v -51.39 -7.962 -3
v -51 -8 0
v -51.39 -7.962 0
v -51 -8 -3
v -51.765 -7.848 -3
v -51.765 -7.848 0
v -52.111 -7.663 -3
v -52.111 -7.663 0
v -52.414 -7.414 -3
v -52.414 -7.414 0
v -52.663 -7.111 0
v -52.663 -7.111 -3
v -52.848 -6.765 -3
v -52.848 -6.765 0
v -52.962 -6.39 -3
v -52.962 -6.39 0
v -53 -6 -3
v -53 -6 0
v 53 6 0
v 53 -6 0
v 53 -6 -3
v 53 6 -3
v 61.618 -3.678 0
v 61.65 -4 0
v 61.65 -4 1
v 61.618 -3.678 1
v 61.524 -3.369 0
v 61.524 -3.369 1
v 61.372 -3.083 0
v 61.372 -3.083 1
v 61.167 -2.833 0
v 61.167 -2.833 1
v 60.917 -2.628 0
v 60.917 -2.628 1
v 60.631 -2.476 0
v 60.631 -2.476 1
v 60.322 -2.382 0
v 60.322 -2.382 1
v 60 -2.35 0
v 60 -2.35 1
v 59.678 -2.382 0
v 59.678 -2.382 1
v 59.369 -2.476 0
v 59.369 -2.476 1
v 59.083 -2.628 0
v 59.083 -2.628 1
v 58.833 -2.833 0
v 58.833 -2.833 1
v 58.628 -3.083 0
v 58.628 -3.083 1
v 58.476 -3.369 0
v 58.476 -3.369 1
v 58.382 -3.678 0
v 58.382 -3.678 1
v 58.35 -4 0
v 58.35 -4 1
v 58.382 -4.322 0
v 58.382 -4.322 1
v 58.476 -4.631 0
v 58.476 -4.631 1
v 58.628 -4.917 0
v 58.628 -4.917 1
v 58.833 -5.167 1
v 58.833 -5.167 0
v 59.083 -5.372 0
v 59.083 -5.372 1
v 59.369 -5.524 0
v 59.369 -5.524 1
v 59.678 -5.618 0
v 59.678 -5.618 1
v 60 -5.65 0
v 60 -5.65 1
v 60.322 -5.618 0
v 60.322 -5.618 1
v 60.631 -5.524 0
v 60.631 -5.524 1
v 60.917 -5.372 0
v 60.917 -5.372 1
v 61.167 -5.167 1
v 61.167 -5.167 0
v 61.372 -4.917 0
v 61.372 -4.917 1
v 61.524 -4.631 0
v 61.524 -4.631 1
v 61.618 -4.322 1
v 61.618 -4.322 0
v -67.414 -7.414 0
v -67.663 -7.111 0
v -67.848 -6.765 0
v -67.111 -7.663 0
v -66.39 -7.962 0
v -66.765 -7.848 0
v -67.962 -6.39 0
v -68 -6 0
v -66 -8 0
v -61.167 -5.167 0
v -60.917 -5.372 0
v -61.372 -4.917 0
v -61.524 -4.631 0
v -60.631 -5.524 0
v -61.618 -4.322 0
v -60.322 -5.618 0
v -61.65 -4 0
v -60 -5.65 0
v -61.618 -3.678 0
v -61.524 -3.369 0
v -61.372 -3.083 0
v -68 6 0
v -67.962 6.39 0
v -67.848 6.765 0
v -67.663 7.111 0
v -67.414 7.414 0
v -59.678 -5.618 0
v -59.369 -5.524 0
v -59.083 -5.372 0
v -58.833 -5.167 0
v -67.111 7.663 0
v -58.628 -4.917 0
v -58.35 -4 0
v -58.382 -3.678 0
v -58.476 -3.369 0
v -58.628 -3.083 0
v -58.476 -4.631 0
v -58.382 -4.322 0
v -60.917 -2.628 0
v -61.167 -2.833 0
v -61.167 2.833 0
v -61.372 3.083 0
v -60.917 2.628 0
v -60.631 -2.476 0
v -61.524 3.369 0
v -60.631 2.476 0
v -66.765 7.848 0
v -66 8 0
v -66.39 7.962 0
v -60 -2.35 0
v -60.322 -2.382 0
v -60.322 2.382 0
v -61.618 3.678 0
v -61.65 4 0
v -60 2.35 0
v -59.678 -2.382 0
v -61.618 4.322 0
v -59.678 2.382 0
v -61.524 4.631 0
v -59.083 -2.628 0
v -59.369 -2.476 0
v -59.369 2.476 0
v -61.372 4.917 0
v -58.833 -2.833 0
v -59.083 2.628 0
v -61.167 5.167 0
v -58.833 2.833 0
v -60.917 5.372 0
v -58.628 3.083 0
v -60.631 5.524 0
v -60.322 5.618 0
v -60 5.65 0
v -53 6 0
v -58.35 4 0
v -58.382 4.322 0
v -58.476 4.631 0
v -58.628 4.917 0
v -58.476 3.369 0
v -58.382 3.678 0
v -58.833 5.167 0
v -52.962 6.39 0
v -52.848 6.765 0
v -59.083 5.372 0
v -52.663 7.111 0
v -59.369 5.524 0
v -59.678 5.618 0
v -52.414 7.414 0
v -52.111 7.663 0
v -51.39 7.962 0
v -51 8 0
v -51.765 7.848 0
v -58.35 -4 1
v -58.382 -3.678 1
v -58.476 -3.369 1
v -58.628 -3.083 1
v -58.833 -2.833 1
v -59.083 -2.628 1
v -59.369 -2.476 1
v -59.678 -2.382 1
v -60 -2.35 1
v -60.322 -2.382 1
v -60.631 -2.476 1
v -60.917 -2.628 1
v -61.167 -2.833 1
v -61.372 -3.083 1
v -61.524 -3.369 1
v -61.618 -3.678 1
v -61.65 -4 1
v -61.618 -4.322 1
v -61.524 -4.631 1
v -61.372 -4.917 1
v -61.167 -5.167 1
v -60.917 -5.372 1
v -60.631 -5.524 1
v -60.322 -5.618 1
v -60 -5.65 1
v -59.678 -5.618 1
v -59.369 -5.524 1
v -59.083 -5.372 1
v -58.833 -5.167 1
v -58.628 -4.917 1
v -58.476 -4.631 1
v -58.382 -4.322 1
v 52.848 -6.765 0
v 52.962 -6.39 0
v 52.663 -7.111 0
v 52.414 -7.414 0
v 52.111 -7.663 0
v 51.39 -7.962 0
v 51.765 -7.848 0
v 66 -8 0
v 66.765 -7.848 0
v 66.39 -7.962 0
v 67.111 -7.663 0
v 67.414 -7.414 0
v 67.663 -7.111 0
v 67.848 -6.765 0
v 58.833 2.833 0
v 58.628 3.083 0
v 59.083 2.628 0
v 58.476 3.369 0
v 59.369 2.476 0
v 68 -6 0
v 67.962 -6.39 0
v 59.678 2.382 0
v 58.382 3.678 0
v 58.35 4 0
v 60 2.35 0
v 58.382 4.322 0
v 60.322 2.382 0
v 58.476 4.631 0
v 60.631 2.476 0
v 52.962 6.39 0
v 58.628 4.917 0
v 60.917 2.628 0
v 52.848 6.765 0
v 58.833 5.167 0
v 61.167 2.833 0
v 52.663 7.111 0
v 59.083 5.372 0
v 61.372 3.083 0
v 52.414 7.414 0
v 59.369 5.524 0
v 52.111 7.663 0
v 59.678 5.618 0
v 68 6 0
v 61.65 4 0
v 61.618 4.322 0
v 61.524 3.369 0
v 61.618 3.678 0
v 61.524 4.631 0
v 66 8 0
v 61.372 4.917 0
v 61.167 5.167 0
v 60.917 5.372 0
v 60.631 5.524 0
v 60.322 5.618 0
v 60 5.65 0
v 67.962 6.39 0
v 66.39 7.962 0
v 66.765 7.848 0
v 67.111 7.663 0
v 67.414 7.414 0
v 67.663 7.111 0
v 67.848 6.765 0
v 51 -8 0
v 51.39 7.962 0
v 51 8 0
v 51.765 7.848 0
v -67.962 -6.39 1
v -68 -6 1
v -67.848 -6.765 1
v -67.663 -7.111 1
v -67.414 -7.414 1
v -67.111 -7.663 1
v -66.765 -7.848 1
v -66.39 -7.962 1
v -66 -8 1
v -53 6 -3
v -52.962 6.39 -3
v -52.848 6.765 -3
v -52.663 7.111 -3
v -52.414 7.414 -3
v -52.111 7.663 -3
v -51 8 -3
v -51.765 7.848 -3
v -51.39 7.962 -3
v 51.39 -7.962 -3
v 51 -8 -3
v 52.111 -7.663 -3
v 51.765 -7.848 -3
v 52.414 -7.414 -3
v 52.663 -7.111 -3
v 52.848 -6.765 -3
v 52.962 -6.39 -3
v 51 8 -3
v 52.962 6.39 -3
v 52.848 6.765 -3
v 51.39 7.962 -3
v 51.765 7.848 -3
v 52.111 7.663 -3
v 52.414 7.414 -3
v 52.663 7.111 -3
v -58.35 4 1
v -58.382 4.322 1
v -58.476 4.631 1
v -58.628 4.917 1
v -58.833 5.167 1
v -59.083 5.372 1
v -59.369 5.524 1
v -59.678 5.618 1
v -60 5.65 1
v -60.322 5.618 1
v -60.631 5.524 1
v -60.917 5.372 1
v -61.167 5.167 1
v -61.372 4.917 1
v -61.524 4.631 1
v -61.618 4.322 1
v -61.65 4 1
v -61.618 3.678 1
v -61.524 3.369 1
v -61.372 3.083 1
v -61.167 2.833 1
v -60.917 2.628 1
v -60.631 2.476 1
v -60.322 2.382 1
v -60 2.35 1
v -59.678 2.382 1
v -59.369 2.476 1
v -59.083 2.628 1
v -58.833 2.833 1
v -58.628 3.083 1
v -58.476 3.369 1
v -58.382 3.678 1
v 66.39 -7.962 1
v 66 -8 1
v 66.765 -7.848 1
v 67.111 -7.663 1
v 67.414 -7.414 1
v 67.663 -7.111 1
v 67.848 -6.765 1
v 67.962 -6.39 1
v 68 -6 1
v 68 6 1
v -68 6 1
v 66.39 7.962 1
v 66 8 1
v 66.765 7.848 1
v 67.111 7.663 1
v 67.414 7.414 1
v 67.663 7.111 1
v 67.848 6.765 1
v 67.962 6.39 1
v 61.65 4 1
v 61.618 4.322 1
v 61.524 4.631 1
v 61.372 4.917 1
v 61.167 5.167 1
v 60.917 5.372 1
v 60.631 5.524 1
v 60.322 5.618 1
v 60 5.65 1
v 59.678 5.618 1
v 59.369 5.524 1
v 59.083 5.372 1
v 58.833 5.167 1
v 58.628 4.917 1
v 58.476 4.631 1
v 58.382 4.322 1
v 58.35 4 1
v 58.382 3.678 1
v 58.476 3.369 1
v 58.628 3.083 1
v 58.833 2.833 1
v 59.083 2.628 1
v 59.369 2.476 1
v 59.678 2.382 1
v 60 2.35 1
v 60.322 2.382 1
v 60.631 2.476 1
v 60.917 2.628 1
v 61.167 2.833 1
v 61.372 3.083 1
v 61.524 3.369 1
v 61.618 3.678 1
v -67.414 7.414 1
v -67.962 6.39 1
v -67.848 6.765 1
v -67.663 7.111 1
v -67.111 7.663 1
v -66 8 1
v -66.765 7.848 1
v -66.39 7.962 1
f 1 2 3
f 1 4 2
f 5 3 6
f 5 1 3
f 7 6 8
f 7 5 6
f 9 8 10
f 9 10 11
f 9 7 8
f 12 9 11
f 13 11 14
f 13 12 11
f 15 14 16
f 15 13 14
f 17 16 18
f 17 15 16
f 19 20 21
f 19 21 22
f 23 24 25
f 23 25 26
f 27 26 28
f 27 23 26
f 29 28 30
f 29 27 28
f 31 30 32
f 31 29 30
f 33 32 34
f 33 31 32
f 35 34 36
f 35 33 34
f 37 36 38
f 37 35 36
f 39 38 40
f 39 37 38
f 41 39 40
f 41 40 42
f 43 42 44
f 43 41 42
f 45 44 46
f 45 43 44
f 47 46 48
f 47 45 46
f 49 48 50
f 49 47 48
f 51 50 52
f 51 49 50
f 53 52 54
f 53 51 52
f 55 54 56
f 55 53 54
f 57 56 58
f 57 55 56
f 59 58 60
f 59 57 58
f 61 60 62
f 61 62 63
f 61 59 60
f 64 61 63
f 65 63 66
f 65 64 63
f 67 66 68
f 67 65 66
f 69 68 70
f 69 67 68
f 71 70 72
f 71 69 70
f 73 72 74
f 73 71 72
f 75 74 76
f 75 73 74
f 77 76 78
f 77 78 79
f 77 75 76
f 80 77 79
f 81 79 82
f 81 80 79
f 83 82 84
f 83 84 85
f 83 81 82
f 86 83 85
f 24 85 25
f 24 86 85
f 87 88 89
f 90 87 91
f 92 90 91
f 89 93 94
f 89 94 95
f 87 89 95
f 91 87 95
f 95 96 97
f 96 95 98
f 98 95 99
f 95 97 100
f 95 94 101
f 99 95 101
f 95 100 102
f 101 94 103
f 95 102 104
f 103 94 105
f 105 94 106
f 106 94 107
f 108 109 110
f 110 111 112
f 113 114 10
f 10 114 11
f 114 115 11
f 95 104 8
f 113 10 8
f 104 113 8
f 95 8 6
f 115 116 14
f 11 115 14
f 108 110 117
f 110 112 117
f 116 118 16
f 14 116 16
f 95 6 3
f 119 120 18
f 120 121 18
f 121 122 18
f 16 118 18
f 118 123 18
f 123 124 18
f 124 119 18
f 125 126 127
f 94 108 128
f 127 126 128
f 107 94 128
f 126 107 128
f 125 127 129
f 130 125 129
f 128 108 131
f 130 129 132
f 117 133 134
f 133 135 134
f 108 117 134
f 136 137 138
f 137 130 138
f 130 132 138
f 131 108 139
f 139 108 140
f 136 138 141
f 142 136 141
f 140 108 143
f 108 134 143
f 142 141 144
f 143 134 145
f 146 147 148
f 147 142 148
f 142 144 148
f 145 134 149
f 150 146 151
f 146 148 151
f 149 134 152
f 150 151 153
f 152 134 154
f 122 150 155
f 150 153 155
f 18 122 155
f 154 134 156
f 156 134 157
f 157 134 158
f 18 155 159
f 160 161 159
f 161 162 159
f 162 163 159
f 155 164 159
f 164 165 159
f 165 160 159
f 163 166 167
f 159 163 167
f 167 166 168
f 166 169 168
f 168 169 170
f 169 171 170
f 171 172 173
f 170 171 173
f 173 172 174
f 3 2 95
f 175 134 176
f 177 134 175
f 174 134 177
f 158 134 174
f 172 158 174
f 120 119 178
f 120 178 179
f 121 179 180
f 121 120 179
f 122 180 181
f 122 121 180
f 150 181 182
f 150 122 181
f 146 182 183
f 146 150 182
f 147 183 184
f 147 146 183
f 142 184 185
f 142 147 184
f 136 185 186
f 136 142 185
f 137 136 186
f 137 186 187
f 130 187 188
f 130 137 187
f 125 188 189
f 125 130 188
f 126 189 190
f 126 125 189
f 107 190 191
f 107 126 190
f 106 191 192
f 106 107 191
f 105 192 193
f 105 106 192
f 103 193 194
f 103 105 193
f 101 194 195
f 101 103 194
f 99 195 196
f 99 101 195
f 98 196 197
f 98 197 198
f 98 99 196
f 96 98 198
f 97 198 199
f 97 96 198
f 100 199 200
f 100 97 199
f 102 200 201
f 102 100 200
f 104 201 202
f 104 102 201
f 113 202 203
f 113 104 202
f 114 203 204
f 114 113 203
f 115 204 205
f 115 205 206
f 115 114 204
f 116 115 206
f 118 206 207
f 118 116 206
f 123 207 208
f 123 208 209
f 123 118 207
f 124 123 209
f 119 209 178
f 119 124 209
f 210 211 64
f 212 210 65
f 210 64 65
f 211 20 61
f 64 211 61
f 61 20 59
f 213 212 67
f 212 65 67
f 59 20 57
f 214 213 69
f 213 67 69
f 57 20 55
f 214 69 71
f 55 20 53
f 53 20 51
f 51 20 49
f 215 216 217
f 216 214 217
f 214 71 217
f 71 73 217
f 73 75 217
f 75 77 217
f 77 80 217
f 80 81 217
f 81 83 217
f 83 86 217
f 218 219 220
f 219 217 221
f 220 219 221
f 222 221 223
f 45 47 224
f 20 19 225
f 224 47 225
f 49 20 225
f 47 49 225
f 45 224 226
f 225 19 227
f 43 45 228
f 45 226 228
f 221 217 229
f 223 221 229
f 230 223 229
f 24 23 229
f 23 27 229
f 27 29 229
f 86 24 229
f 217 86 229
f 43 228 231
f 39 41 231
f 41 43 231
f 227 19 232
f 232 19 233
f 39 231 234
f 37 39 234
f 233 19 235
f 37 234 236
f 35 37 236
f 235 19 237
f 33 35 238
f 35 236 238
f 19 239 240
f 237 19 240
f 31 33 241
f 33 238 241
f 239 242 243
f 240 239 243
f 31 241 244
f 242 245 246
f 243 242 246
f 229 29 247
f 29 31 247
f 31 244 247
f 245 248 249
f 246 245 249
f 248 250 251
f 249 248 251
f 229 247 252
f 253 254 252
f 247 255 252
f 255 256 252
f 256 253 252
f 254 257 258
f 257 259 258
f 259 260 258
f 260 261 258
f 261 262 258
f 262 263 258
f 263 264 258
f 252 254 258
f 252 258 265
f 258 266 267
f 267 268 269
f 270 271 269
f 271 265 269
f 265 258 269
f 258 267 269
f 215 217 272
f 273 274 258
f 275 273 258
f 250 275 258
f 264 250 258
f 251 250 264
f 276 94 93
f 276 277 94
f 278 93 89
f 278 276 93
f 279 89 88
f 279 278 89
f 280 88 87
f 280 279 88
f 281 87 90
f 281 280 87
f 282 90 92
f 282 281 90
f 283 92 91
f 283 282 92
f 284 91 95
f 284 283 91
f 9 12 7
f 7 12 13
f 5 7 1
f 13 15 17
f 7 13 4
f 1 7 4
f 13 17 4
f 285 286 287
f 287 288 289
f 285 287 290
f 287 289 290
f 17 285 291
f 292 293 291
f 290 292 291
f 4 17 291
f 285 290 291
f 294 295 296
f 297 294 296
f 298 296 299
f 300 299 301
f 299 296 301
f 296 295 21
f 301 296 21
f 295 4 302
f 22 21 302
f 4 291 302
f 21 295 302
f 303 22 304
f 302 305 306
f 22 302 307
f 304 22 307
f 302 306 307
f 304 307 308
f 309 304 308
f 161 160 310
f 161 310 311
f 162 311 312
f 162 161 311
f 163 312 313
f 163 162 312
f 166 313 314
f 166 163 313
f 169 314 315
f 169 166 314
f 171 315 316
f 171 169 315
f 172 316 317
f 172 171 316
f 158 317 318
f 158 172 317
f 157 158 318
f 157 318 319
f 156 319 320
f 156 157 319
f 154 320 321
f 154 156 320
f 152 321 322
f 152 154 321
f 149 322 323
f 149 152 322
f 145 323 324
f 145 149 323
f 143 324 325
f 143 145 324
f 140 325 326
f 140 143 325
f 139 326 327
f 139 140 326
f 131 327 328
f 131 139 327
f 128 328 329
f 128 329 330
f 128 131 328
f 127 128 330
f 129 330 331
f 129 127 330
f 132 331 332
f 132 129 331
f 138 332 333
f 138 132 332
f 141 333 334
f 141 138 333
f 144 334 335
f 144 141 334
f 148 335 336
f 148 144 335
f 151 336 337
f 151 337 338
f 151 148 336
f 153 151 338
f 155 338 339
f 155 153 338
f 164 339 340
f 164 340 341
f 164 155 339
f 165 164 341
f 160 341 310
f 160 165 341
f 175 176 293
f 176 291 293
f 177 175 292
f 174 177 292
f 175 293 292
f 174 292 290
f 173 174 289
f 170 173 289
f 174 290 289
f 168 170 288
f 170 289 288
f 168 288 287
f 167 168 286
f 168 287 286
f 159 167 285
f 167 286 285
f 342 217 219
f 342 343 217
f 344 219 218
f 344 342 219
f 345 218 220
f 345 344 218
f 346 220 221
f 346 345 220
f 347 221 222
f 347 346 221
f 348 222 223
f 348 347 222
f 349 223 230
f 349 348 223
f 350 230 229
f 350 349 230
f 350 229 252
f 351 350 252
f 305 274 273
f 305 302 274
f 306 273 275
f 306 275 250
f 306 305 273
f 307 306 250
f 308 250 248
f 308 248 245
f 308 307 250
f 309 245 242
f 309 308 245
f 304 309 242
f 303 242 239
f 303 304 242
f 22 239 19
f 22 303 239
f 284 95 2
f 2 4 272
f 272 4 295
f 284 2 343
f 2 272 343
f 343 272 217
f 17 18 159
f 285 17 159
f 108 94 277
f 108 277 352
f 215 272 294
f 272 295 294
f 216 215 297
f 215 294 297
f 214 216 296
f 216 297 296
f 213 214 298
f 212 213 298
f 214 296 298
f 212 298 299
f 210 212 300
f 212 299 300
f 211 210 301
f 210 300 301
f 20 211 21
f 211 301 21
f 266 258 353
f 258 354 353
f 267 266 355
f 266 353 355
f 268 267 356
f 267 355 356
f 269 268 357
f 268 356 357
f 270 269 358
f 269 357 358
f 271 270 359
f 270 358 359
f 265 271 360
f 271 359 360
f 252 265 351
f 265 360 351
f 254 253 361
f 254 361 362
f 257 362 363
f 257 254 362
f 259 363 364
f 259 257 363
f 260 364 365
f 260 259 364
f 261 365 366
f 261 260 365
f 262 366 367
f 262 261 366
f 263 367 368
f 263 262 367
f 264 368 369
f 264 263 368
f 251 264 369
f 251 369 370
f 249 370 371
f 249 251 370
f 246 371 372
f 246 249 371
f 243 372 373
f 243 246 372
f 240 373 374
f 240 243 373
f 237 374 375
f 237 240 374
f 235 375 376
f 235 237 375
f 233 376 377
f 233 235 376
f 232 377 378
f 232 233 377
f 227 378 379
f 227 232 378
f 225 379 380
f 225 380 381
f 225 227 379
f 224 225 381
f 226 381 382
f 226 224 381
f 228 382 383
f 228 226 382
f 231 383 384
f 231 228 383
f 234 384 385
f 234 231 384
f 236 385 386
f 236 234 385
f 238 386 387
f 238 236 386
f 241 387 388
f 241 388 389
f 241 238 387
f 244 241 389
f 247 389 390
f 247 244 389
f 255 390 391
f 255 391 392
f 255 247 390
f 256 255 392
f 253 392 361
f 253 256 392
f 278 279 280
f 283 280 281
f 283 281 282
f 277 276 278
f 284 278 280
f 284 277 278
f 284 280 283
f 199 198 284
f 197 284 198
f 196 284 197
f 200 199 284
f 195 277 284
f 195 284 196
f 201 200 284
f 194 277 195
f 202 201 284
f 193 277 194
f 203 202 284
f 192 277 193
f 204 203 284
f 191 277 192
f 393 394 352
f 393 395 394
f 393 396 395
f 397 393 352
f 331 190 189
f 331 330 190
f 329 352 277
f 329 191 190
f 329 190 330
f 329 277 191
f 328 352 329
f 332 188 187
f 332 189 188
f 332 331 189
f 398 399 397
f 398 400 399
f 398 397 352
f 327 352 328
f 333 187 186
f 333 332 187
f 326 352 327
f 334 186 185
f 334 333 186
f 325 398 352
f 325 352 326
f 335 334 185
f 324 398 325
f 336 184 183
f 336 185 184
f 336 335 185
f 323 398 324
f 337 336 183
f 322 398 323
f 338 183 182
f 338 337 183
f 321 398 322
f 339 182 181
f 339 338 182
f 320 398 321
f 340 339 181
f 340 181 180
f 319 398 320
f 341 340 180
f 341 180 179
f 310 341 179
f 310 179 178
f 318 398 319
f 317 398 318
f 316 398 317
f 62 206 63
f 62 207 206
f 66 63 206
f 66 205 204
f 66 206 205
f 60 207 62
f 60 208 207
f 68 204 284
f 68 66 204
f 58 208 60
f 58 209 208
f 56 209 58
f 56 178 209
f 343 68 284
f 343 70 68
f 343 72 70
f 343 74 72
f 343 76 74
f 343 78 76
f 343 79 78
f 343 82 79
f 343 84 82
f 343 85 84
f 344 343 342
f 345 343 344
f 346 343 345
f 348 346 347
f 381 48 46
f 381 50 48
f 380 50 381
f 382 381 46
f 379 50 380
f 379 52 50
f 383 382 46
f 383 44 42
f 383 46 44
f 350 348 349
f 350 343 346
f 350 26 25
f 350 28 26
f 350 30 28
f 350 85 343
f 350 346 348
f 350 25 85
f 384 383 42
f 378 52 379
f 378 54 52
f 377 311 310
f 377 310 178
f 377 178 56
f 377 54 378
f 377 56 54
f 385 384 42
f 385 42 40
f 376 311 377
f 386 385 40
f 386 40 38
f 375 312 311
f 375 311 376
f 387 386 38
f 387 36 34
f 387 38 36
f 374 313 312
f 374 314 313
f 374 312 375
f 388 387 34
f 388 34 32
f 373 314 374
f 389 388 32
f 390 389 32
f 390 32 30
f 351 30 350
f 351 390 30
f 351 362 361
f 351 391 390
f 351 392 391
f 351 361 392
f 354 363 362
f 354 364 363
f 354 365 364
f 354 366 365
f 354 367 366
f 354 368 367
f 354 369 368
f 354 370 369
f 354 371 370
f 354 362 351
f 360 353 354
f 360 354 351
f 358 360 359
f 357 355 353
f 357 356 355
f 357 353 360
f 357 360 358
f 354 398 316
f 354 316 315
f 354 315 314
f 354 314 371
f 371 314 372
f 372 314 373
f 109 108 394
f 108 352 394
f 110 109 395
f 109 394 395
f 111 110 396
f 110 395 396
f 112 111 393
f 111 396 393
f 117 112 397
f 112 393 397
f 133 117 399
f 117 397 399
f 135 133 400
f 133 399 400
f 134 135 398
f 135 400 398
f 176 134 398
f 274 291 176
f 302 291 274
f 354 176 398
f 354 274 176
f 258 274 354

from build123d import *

# Parameters (mm, degrees)
SKETCH_W     = 136
SKETCH_H     = 16
SKETCH_R     = 1.65
PAD_DEPTH    = 1
SKETCH001_W  = 106
SKETCH001_H  = 16
PAD001_DEPTH = 3
FILLET_R     = 2


with BuildPart() as part:
    # Sketch → Pad (new body)
    with BuildSketch(Plane.XY):
        Rectangle(SKETCH_W, SKETCH_H)
        with Locations((-60, 4)):
            Circle(SKETCH_R, mode=Mode.SUBTRACT)
        with Locations((-60, -4)):
            Circle(SKETCH_R, mode=Mode.SUBTRACT)
        with Locations((60, 4)):
            Circle(SKETCH_R, mode=Mode.SUBTRACT)
        with Locations((60, -4)):
            Circle(SKETCH_R, mode=Mode.SUBTRACT)
    extrude(amount=PAD_DEPTH)

    # Sketch001 → Pad001 (join)
    with BuildSketch(Plane.XY):
        Rectangle(SKETCH001_W, SKETCH001_H)
    extrude(amount=-PAD001_DEPTH)

    # Fillet
    fillet_edges = [part.edges().sort_by_distance(p)[0] for p in [
        (53, 8, -1.5),
        (53, -8, -1.5),
        (-53, -8, -1.5),
        (-53, 8, -1.5),
        (-68, 8, 0.5),
        (-68, -8, 0.5),
        (68, -8, 0.5),
        (68, 8, 0.5),
    ]]
    fillet(fillet_edges, radius=FILLET_R)


solid = part.part
